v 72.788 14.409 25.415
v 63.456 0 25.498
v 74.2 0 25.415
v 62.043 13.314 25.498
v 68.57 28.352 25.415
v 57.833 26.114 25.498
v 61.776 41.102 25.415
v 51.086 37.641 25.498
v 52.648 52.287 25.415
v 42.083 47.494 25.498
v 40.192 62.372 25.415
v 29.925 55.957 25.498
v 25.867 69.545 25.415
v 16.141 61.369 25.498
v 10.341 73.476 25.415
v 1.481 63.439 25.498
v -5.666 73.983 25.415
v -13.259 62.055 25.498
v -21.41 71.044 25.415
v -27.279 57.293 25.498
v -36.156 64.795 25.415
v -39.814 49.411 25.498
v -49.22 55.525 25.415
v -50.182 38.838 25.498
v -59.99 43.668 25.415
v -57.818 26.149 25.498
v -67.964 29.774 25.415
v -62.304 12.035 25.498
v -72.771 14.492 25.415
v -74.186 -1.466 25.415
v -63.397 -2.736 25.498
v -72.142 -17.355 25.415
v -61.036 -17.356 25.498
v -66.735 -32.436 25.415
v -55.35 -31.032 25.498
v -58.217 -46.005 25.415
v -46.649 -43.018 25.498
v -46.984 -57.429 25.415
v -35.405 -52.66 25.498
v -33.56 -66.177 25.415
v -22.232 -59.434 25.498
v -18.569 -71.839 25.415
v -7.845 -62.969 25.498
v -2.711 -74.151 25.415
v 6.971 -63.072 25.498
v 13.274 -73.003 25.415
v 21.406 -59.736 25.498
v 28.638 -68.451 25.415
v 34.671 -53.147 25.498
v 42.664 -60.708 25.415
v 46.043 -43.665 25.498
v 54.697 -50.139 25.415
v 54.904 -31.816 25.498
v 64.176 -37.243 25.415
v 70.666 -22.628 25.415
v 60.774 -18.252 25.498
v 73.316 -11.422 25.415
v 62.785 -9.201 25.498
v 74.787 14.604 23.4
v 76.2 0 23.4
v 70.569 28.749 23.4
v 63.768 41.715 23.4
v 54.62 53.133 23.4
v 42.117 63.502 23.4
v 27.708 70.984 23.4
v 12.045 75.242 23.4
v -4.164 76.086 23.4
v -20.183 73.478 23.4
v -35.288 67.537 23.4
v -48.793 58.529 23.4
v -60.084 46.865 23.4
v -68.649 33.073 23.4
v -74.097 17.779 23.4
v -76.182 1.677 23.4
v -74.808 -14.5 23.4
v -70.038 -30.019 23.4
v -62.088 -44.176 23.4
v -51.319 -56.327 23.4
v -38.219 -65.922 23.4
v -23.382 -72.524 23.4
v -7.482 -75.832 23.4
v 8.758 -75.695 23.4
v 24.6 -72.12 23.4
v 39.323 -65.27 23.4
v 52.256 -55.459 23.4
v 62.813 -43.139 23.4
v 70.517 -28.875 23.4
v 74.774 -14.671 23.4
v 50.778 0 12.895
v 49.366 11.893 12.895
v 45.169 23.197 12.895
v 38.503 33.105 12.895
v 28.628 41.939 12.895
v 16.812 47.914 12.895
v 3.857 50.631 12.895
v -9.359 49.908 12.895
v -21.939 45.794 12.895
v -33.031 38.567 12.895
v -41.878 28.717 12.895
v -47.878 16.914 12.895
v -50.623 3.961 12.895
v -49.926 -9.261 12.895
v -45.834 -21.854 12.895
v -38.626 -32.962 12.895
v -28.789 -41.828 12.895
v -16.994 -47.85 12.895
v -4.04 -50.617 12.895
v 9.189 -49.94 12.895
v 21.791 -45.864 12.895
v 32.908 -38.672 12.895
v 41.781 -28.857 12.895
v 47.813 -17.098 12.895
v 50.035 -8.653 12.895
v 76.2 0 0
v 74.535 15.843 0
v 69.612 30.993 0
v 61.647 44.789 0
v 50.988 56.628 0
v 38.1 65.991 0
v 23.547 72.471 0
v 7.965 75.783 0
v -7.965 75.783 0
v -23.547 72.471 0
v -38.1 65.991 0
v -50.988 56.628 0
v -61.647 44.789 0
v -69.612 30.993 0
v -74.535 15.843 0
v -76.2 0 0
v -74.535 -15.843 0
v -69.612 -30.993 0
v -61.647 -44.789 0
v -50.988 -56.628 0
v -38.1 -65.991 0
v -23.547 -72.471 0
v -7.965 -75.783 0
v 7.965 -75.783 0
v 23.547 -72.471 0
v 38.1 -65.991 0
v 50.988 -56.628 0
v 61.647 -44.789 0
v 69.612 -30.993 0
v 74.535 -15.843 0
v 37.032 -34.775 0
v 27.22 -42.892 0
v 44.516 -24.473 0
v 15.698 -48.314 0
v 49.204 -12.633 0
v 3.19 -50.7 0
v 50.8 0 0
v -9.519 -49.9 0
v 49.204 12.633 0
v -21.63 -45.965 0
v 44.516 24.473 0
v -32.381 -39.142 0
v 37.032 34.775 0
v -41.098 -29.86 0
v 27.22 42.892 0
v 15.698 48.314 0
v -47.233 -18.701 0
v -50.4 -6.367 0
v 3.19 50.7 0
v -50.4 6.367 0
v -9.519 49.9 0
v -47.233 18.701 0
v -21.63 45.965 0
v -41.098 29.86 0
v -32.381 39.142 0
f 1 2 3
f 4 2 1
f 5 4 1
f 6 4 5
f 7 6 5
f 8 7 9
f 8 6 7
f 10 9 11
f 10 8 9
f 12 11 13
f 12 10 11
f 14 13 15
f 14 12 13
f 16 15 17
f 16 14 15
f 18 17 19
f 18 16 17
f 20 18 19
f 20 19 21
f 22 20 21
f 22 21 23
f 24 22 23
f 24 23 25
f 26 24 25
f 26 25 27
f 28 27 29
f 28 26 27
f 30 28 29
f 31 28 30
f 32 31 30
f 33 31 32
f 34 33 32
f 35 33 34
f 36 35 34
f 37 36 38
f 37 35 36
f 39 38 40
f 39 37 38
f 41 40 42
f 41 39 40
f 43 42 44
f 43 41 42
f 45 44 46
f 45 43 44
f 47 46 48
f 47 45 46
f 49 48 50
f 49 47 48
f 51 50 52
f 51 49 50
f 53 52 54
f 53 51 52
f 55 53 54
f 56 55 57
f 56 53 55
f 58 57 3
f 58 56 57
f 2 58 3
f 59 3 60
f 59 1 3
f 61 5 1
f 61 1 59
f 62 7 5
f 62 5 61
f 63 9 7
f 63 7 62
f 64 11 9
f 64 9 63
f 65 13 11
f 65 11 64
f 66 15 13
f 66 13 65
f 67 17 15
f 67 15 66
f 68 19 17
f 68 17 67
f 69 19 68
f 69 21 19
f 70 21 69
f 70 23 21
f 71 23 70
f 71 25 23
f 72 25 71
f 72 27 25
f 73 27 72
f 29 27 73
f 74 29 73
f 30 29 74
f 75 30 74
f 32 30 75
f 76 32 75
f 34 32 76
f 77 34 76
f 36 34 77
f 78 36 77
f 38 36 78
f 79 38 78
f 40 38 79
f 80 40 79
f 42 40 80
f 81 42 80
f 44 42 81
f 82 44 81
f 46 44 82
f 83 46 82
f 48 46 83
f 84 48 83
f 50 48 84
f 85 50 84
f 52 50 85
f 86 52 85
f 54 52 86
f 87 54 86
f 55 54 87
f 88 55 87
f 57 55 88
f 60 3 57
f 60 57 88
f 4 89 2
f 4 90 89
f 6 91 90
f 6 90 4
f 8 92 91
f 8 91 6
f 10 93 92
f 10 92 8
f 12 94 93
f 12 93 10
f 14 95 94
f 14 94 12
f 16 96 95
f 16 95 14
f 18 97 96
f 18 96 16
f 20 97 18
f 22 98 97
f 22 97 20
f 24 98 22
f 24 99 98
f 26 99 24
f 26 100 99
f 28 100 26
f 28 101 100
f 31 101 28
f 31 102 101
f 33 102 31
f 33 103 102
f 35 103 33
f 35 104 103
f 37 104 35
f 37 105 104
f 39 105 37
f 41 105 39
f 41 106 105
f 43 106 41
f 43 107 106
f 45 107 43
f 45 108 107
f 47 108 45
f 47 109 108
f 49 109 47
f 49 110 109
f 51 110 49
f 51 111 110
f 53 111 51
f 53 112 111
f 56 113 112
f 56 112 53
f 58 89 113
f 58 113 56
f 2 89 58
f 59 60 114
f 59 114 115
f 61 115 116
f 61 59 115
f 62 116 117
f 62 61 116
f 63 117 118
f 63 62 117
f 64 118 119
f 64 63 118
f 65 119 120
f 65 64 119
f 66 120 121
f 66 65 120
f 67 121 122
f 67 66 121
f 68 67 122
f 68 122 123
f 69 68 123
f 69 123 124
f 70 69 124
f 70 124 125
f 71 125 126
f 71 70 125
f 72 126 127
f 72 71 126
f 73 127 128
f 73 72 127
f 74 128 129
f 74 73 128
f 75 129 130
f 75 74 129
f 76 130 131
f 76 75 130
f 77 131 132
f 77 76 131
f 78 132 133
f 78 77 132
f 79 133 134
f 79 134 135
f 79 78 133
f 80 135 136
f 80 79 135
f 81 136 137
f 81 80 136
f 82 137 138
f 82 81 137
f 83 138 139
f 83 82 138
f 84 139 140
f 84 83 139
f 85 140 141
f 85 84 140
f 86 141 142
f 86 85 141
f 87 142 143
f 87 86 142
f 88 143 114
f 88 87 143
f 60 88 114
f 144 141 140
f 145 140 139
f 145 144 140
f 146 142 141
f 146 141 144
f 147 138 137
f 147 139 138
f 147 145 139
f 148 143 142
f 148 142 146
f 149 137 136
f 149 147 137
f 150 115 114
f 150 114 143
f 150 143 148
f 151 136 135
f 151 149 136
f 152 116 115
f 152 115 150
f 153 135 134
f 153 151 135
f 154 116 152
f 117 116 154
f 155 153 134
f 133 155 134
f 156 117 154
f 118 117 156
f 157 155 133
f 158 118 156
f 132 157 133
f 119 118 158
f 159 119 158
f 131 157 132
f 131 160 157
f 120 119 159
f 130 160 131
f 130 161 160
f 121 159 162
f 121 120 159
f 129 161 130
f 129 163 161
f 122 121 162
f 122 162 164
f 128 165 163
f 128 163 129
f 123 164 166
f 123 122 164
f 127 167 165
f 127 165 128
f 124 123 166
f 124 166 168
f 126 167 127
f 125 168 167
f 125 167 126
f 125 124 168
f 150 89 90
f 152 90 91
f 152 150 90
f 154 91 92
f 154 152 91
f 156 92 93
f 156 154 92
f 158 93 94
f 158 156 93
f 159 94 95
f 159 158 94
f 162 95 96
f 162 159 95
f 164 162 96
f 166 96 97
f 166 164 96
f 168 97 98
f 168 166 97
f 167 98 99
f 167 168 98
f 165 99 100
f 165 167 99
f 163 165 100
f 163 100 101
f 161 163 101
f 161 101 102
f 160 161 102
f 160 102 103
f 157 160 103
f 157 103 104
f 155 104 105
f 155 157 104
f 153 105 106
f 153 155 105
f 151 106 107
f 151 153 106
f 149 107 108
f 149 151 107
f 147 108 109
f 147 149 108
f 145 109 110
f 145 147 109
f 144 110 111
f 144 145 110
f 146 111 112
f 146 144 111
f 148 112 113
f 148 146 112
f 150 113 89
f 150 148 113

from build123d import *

# Parameters (mm, degrees)
F2_SIZE = 12.7
F3_SIZE = 2


with BuildPart() as f1:
    # F0 (on Front) → F1 (revolve)
    with BuildSketch(Plane.XZ):
        Polygon((50.756192, 25.59499), (50.800075, 0), (76.2, 0), (76.2, 25.4), align=None)
    revolve(axis=Axis((0, 0, 20.958871), (0, 0, 1)))

    # F2
    f2_edges = [f1.edges().sort_by_distance(p)[0] for p in [
        (-50.756192, 0, 25.59499),
    ]]
    chamfer(f2_edges, length=F2_SIZE)

    # F3
    f3_edges = [f1.edges().sort_by_distance(p)[0] for p in [
        (-76.2, 0, 25.4),
    ]]
    chamfer(f3_edges, length=F3_SIZE)


solid = f1.part
